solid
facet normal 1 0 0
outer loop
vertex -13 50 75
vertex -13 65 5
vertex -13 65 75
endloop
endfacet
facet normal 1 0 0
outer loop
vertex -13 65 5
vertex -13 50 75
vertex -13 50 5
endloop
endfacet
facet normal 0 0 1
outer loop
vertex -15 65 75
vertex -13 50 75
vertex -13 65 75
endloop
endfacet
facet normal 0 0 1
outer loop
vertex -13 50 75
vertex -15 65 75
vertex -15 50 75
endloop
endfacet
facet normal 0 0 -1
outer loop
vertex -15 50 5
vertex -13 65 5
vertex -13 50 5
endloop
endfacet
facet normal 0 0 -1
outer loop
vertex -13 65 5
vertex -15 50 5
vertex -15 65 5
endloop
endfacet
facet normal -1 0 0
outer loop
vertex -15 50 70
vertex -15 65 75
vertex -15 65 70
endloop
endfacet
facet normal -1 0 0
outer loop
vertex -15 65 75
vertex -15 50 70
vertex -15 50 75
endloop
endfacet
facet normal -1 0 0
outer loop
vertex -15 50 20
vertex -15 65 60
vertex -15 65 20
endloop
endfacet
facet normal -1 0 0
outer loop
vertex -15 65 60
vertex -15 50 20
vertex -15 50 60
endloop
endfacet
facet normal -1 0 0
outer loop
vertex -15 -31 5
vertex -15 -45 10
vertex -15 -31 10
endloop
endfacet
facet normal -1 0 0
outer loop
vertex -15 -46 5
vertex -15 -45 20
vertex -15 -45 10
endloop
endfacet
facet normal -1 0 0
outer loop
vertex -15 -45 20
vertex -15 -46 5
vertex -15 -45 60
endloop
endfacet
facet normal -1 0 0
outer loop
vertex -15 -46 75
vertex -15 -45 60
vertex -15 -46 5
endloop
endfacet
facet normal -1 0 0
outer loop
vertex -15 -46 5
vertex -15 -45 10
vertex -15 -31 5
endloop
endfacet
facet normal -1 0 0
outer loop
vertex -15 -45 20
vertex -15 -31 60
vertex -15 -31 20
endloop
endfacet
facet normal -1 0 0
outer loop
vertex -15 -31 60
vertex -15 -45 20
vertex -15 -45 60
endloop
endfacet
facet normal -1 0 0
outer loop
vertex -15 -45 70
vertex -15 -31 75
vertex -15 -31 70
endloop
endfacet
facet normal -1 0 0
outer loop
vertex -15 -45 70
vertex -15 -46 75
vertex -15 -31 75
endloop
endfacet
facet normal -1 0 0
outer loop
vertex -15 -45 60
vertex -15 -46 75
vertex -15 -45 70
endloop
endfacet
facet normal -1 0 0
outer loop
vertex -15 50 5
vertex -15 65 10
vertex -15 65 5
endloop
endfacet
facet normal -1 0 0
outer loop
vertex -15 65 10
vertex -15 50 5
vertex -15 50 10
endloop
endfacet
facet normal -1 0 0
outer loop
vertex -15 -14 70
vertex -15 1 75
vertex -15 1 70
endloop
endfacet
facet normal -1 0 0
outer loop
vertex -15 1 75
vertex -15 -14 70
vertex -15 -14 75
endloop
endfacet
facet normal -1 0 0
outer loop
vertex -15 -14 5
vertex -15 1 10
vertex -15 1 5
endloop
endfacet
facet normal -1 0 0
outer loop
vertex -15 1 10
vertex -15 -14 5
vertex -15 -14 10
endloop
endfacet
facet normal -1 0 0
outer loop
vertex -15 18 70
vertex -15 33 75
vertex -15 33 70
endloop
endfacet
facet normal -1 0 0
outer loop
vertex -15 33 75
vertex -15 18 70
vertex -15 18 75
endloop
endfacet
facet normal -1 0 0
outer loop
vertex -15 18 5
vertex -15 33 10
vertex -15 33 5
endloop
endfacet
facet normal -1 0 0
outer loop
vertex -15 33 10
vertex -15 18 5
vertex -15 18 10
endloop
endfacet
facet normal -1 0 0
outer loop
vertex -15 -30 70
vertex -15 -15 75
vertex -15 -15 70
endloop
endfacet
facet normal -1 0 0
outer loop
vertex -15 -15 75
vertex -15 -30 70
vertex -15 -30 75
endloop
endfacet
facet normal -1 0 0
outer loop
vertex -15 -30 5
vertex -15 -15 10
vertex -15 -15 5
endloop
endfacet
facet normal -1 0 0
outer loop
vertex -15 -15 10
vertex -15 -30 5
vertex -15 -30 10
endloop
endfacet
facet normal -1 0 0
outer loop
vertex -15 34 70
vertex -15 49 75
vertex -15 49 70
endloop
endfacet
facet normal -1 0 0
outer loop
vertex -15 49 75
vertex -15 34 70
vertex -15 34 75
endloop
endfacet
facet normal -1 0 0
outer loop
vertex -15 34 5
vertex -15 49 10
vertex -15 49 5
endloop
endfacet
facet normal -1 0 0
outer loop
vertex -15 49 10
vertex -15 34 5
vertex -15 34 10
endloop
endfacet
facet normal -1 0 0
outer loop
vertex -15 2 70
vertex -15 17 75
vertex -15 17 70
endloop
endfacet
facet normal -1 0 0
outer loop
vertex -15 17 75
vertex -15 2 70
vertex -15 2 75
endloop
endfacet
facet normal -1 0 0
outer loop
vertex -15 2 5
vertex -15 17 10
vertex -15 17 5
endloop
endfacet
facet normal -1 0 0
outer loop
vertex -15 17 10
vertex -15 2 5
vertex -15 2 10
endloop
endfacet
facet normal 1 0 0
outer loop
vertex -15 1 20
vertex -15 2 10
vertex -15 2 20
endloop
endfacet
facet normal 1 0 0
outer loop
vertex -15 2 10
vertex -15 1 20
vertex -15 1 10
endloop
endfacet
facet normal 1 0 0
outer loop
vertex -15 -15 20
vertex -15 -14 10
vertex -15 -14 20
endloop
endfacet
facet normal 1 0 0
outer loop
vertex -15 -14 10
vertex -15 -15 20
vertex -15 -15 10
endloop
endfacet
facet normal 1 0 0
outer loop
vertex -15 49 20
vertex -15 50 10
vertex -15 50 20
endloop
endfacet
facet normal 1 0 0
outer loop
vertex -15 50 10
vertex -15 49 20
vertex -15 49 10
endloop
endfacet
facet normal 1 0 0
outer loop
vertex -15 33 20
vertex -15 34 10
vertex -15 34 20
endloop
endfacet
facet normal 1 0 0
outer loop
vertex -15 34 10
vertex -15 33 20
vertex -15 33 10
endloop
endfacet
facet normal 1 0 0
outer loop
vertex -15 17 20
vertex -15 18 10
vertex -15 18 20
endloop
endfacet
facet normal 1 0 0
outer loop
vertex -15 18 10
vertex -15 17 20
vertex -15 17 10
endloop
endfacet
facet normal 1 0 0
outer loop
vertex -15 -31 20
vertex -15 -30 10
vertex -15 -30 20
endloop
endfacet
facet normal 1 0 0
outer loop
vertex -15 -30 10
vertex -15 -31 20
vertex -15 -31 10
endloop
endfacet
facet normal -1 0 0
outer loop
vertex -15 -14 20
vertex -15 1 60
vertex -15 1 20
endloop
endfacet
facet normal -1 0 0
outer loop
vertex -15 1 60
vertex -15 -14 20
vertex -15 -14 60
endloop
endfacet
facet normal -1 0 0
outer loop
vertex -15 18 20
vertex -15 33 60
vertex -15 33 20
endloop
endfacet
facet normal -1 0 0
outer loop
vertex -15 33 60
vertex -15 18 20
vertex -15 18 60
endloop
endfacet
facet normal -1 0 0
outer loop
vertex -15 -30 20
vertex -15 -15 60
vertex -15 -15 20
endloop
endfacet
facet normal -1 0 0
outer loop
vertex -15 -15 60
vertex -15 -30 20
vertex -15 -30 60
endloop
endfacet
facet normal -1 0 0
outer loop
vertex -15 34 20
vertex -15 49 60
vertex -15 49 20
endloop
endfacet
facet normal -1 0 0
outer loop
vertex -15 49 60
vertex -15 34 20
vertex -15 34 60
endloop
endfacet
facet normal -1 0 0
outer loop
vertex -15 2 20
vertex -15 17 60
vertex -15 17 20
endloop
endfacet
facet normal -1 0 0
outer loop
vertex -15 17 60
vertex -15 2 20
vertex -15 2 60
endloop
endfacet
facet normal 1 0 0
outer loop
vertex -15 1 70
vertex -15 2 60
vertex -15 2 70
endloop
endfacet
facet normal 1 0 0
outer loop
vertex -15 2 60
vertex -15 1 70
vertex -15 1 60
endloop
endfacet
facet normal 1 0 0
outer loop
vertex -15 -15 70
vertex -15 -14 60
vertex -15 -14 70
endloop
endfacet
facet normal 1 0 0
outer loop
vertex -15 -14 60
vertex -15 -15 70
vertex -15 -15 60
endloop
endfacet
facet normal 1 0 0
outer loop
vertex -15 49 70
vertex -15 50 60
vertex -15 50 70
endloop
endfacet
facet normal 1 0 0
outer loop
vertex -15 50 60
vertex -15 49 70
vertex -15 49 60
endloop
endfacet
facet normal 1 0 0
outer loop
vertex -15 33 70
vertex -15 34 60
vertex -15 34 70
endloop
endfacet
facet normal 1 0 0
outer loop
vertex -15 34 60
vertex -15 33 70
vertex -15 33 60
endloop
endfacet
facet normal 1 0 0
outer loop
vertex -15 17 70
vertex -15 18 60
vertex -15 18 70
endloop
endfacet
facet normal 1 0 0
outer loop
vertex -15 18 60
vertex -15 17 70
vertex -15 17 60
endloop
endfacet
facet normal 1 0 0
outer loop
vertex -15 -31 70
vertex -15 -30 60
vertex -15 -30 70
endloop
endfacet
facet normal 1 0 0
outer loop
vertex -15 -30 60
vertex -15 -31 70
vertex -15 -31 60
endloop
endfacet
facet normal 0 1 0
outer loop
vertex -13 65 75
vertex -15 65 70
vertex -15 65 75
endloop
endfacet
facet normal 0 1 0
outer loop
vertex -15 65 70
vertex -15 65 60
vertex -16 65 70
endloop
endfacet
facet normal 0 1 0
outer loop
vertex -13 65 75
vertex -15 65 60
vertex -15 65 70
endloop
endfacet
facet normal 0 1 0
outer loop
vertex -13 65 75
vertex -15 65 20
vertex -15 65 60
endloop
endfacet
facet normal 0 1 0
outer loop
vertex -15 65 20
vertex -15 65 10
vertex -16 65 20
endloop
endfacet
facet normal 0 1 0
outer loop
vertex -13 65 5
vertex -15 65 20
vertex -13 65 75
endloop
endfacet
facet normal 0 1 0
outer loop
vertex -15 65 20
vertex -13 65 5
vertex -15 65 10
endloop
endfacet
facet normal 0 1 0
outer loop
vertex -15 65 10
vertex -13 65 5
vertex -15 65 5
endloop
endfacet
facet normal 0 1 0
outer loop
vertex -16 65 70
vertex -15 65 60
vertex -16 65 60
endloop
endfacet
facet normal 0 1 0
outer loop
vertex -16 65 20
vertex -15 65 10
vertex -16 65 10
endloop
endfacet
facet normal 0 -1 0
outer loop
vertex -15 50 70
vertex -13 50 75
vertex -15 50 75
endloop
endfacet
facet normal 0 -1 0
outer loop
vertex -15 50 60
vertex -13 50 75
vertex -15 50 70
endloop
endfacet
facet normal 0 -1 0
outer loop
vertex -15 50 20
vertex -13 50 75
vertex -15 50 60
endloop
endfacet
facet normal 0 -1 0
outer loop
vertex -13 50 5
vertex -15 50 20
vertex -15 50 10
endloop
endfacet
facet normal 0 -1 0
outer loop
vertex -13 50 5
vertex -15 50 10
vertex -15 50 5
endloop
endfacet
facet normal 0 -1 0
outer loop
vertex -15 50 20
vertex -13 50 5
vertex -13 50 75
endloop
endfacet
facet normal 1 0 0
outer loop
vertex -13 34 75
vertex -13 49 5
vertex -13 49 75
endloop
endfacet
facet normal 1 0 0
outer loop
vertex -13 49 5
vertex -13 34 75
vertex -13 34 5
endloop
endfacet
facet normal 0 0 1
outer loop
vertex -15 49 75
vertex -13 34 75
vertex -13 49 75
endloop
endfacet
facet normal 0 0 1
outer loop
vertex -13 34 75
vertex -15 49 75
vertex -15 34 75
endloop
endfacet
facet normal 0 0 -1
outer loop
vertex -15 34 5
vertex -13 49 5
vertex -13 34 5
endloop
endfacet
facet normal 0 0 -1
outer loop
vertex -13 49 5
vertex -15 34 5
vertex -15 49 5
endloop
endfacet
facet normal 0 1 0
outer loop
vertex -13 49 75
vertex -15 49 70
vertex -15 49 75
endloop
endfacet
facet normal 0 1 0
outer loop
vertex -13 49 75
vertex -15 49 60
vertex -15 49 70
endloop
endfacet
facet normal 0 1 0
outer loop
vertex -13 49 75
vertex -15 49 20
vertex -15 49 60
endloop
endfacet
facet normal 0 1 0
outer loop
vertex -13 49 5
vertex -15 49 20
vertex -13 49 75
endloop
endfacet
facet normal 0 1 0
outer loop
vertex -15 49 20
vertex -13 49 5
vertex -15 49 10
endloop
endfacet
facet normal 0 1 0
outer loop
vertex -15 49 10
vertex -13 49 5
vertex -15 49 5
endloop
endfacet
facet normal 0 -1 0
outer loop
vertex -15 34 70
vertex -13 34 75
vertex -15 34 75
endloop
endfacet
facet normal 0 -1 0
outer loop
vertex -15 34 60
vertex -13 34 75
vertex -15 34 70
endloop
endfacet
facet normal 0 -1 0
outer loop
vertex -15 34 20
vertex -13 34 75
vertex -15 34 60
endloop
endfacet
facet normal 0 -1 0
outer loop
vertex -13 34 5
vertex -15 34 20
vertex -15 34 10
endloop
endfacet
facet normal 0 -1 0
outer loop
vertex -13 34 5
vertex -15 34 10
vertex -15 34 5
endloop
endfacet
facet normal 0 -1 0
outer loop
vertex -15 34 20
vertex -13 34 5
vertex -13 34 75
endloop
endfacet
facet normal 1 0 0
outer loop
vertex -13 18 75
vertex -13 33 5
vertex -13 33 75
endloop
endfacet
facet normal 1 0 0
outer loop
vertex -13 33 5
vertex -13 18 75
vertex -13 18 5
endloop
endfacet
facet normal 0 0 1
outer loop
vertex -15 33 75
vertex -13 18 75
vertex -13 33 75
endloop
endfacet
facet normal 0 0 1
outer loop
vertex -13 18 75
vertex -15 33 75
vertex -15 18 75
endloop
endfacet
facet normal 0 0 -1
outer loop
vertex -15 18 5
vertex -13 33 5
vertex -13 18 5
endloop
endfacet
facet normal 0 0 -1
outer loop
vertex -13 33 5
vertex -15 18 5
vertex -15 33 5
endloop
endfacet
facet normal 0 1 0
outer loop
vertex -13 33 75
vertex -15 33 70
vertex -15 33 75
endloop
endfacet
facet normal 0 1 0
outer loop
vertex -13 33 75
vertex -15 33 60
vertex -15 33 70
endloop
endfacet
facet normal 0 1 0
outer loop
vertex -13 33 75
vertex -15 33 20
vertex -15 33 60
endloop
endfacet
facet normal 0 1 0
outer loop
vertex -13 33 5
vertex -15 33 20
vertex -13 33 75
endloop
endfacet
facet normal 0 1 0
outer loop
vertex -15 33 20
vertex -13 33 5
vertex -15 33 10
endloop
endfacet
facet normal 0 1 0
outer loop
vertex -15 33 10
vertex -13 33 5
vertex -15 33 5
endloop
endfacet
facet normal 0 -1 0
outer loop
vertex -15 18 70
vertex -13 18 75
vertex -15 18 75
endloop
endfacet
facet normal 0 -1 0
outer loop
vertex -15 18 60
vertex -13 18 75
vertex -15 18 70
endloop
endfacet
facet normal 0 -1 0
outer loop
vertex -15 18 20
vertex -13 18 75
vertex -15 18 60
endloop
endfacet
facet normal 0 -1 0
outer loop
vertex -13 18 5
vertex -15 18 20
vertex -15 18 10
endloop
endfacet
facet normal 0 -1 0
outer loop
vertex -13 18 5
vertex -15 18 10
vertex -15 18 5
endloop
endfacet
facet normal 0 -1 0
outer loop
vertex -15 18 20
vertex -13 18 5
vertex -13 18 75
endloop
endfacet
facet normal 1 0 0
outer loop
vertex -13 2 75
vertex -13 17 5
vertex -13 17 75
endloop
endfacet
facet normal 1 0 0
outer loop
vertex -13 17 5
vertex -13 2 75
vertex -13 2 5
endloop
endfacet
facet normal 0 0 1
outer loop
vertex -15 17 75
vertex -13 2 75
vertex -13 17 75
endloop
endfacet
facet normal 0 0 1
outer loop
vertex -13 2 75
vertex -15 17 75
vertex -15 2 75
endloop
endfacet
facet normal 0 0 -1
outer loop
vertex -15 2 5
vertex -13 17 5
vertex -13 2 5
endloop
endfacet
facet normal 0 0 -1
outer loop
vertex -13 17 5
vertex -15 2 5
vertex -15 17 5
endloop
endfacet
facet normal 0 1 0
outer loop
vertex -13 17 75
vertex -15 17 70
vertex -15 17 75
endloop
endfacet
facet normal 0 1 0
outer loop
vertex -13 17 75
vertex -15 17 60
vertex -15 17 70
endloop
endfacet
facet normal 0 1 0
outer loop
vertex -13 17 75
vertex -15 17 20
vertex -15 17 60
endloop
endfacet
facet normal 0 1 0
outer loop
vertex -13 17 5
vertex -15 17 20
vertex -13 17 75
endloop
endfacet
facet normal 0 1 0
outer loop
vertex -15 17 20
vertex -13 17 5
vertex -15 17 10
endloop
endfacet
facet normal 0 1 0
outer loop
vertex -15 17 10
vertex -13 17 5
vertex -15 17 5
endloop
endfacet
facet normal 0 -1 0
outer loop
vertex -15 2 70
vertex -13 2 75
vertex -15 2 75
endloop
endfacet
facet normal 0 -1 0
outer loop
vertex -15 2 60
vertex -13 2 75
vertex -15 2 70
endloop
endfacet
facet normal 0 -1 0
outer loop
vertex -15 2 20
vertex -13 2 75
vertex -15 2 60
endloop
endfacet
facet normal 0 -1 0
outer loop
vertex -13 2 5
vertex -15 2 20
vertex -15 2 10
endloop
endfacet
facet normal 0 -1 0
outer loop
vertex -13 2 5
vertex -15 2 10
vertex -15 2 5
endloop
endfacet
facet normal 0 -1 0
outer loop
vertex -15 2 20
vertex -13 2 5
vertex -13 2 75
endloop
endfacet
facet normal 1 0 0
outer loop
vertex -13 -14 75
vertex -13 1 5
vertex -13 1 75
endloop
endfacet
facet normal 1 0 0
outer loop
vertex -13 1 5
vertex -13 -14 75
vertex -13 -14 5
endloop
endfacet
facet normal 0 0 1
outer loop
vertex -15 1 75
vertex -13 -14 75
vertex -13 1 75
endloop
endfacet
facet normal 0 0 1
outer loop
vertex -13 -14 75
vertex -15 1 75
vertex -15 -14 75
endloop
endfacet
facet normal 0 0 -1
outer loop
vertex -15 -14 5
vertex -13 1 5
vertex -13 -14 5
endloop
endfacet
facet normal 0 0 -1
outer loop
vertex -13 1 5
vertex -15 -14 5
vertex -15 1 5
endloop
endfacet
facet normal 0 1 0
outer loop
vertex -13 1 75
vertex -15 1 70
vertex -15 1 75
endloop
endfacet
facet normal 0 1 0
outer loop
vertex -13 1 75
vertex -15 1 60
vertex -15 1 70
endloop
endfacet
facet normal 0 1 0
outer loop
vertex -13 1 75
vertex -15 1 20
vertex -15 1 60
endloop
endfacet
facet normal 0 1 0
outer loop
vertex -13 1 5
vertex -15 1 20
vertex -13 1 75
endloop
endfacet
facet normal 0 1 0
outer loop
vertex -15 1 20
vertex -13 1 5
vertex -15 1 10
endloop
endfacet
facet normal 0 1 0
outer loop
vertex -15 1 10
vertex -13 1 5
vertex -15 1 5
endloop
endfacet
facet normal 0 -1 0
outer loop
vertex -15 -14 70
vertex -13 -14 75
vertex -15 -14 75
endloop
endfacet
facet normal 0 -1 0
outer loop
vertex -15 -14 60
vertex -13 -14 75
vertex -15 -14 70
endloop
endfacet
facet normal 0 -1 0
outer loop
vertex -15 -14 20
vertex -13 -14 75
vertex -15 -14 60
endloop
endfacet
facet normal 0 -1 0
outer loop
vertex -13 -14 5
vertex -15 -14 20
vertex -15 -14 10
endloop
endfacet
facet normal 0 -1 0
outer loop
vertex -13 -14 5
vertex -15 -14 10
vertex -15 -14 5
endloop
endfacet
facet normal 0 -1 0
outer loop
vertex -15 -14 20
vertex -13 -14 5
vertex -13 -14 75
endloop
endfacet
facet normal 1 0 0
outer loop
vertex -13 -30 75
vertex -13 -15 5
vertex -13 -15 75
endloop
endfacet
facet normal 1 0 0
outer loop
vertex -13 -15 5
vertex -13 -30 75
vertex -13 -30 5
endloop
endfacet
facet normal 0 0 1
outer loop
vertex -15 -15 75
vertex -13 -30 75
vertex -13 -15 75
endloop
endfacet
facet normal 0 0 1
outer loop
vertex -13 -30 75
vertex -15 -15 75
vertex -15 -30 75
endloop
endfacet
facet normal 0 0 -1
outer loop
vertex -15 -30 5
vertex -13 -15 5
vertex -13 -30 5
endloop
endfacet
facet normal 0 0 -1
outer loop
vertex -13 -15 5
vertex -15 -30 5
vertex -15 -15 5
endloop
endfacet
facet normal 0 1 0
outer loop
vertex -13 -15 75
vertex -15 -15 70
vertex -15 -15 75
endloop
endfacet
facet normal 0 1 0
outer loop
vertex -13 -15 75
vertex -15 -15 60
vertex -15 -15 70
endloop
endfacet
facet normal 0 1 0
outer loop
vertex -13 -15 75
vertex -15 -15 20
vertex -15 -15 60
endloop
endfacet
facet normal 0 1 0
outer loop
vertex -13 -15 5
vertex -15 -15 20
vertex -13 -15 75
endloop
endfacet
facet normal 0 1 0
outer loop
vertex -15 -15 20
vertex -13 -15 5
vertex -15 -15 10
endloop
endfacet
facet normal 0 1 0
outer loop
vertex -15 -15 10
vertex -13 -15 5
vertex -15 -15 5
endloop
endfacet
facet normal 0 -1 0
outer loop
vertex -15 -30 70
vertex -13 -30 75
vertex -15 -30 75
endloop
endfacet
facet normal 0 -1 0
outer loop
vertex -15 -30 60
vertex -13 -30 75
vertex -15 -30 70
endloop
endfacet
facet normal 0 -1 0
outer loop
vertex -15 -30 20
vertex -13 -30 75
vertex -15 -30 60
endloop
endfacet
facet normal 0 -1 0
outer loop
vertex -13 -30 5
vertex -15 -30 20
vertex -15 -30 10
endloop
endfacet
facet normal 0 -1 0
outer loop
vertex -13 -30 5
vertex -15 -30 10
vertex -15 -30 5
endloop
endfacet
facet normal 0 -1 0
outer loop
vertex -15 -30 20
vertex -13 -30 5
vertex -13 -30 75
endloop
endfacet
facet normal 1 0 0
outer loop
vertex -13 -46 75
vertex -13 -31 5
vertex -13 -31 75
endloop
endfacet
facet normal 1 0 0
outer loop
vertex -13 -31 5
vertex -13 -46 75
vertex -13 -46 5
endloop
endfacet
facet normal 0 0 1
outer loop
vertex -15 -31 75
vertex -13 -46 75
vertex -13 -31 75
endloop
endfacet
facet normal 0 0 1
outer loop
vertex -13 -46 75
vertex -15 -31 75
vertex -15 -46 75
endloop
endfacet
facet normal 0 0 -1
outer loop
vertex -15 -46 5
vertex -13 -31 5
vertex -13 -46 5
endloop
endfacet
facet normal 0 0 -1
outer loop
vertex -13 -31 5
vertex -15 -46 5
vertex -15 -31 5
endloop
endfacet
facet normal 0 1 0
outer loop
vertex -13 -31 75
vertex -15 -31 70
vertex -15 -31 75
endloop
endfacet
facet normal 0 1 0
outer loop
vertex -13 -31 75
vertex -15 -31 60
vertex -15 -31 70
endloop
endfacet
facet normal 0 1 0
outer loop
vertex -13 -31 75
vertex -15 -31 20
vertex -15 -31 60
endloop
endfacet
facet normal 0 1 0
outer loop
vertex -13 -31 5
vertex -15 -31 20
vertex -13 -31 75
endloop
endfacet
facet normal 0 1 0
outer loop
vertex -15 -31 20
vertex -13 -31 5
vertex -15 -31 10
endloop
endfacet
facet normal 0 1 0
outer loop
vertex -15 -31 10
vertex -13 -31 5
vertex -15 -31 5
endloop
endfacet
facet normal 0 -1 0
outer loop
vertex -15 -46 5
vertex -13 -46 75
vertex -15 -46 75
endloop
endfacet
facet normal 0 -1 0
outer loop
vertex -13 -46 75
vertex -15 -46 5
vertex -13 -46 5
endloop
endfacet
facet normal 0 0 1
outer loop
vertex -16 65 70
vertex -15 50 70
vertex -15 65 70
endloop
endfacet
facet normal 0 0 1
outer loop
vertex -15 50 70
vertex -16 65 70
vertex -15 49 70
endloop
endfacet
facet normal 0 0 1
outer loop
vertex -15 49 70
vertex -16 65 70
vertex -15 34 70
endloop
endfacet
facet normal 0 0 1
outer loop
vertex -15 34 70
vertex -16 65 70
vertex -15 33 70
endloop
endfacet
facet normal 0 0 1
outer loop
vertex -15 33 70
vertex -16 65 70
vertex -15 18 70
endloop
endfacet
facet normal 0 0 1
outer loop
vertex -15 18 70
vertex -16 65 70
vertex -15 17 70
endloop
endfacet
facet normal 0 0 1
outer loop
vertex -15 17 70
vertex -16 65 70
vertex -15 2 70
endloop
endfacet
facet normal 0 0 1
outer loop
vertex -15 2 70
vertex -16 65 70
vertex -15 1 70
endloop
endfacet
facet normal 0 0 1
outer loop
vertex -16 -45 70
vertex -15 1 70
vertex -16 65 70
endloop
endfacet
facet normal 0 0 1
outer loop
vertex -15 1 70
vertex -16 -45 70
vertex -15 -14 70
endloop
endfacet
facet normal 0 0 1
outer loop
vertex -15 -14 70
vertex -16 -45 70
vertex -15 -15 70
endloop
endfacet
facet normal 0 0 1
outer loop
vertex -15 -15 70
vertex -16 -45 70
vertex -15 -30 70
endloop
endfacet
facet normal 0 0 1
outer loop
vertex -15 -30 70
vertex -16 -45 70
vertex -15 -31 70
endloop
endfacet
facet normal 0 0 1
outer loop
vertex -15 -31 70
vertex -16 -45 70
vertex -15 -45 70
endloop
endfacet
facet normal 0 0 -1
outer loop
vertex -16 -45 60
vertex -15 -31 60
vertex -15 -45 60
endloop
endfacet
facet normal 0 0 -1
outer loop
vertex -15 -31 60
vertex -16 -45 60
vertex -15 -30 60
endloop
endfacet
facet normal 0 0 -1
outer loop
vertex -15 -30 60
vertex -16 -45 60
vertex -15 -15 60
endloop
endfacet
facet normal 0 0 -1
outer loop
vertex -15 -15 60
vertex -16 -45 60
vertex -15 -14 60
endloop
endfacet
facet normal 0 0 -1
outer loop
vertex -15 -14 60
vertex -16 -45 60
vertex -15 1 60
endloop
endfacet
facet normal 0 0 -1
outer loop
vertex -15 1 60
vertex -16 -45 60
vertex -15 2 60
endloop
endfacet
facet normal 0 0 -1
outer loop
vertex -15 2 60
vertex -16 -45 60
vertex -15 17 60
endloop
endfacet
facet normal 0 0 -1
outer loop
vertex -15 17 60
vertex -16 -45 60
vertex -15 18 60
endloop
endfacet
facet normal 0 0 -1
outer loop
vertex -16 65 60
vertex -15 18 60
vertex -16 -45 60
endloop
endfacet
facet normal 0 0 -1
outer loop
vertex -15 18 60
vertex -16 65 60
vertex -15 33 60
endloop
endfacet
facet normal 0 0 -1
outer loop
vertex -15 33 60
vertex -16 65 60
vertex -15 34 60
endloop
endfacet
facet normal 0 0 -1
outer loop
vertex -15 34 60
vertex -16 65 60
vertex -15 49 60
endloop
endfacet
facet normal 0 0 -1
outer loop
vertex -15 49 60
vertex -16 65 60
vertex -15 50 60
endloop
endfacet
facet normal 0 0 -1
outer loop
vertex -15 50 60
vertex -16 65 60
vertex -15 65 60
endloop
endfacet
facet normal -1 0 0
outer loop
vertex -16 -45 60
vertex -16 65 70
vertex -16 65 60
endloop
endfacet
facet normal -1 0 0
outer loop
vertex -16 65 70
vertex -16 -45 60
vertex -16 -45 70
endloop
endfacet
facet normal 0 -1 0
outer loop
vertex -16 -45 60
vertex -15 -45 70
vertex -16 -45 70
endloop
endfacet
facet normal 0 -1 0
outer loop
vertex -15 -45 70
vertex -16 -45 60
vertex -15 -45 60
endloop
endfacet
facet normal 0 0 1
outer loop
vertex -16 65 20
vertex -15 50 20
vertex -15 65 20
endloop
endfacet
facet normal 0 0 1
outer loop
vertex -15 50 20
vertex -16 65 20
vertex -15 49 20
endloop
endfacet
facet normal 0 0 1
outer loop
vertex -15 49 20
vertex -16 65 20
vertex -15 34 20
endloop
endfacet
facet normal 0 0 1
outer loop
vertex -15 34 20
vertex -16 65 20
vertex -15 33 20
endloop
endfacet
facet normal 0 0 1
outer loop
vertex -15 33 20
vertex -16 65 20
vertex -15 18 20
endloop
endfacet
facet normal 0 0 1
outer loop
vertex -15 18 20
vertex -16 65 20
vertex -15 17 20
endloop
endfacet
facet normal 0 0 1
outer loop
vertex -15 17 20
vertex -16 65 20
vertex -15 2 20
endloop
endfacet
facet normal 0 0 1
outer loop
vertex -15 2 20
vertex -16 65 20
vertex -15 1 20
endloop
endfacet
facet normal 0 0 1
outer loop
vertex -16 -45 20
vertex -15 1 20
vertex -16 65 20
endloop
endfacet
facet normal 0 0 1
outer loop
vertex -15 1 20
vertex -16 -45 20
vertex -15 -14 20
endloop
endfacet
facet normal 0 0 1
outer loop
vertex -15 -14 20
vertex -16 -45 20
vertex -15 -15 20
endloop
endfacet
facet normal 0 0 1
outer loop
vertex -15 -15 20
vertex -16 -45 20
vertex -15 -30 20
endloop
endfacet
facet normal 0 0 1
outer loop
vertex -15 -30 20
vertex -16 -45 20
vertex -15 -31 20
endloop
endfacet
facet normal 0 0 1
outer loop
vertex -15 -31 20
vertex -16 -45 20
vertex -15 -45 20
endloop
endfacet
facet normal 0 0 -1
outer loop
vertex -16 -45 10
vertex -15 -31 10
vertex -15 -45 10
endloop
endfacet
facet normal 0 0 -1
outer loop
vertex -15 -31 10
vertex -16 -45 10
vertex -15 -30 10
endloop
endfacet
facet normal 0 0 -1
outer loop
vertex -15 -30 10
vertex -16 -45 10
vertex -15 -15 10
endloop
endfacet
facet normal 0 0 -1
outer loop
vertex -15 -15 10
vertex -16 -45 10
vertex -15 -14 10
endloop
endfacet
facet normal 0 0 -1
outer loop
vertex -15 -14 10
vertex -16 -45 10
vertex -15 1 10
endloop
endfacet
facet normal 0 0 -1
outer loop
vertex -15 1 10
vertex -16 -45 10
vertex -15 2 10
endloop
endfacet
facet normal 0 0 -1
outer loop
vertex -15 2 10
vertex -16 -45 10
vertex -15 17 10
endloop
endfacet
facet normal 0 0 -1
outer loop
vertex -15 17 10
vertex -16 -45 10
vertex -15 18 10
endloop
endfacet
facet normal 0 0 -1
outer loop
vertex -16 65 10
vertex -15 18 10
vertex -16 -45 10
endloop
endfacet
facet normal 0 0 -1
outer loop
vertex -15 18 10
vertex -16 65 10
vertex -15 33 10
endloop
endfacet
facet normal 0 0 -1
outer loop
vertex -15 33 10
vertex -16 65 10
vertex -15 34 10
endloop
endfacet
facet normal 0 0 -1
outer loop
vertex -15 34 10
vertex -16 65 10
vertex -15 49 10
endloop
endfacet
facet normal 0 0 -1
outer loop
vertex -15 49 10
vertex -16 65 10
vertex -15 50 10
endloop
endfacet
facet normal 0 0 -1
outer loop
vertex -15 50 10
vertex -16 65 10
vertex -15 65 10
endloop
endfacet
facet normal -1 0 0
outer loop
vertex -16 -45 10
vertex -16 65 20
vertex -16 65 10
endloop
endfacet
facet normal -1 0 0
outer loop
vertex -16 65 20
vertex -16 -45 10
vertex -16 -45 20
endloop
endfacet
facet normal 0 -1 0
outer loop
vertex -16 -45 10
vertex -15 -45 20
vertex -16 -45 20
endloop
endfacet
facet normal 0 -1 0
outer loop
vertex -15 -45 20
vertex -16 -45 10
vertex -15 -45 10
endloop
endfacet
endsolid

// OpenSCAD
module fence(){

	for(i= [0:6])
	{
		translate([-15, 50-16*i, 5])
			cube([2, 15, 70]);
	}
	translate([-16, -45, 60])
		cube([1, 110, 10]);

	translate([-16, -45, 10])
		cube([1, 110, 10]);
}

fence();
